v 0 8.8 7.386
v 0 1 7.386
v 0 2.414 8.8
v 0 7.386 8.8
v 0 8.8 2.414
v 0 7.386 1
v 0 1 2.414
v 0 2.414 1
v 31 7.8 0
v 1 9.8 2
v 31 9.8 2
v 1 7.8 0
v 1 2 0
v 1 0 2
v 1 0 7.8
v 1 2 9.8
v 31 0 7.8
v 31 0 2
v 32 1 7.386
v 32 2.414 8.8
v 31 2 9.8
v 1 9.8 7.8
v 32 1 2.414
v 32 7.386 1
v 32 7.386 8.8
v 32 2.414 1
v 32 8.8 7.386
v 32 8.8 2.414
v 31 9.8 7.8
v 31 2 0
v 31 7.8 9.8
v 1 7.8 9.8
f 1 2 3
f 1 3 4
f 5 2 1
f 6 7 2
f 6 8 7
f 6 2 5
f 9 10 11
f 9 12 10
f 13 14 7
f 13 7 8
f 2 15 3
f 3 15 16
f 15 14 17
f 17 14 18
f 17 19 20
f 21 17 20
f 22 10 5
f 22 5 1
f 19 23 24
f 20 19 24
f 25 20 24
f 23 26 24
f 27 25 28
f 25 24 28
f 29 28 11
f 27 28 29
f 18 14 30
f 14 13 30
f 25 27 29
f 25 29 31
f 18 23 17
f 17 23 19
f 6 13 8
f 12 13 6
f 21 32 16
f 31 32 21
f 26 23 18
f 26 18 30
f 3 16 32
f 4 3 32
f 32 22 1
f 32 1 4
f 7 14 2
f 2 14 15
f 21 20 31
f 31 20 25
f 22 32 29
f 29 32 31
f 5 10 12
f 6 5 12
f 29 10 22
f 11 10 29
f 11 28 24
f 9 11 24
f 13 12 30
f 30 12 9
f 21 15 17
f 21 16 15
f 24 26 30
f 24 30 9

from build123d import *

# Parameters (mm, degrees)
BOX_W           = 32
BOX_H           = 9.8
BOX_DEPTH       = 9.8
CHAMFER_SIZE    = 2
CHAMFER001_SIZE = 1
CHAMFER002_SIZE = 1


with BuildPart() as part:
    # Box → Box (new body)
    with BuildSketch(Plane.XY):
        with Locations((16, 4.9)):
            Rectangle(BOX_W, BOX_H)
    extrude(amount=BOX_DEPTH)

    # Chamfer
    chamfer_edges = [part.edges().sort_by_distance(p)[0] for p in [
        (16, 0, 0),
        (16, 0, 9.8),
        (16, 9.8, 0),
        (16, 9.8, 9.8),
    ]]
    chamfer(chamfer_edges, length=CHAMFER_SIZE)

    # Chamfer001
    chamfer001_edges = [part.edges().sort_by_distance(p)[0] for p in [
        (0, 0, 4.9),
        (0, 1, 1),
        (0, 1, 8.8),
        (0, 4.9, 0),
        (0, 4.9, 9.8),
        (0, 8.8, 1),
        (0, 8.8, 8.8),
        (0, 9.8, 4.9),
    ]]
    chamfer(chamfer001_edges, length=CHAMFER001_SIZE)

    # Chamfer002
    chamfer002_edges = [part.edges().sort_by_distance(p)[0] for p in [
        (32, 0, 4.9),
        (32, 1, 1),
        (32, 1, 8.8),
        (32, 4.9, 0),
        (32, 4.9, 9.8),
        (32, 8.8, 1),
        (32, 8.8, 8.8),
        (32, 9.8, 4.9),
    ]]
    chamfer(chamfer002_edges, length=CHAMFER002_SIZE)


solid = part.part
